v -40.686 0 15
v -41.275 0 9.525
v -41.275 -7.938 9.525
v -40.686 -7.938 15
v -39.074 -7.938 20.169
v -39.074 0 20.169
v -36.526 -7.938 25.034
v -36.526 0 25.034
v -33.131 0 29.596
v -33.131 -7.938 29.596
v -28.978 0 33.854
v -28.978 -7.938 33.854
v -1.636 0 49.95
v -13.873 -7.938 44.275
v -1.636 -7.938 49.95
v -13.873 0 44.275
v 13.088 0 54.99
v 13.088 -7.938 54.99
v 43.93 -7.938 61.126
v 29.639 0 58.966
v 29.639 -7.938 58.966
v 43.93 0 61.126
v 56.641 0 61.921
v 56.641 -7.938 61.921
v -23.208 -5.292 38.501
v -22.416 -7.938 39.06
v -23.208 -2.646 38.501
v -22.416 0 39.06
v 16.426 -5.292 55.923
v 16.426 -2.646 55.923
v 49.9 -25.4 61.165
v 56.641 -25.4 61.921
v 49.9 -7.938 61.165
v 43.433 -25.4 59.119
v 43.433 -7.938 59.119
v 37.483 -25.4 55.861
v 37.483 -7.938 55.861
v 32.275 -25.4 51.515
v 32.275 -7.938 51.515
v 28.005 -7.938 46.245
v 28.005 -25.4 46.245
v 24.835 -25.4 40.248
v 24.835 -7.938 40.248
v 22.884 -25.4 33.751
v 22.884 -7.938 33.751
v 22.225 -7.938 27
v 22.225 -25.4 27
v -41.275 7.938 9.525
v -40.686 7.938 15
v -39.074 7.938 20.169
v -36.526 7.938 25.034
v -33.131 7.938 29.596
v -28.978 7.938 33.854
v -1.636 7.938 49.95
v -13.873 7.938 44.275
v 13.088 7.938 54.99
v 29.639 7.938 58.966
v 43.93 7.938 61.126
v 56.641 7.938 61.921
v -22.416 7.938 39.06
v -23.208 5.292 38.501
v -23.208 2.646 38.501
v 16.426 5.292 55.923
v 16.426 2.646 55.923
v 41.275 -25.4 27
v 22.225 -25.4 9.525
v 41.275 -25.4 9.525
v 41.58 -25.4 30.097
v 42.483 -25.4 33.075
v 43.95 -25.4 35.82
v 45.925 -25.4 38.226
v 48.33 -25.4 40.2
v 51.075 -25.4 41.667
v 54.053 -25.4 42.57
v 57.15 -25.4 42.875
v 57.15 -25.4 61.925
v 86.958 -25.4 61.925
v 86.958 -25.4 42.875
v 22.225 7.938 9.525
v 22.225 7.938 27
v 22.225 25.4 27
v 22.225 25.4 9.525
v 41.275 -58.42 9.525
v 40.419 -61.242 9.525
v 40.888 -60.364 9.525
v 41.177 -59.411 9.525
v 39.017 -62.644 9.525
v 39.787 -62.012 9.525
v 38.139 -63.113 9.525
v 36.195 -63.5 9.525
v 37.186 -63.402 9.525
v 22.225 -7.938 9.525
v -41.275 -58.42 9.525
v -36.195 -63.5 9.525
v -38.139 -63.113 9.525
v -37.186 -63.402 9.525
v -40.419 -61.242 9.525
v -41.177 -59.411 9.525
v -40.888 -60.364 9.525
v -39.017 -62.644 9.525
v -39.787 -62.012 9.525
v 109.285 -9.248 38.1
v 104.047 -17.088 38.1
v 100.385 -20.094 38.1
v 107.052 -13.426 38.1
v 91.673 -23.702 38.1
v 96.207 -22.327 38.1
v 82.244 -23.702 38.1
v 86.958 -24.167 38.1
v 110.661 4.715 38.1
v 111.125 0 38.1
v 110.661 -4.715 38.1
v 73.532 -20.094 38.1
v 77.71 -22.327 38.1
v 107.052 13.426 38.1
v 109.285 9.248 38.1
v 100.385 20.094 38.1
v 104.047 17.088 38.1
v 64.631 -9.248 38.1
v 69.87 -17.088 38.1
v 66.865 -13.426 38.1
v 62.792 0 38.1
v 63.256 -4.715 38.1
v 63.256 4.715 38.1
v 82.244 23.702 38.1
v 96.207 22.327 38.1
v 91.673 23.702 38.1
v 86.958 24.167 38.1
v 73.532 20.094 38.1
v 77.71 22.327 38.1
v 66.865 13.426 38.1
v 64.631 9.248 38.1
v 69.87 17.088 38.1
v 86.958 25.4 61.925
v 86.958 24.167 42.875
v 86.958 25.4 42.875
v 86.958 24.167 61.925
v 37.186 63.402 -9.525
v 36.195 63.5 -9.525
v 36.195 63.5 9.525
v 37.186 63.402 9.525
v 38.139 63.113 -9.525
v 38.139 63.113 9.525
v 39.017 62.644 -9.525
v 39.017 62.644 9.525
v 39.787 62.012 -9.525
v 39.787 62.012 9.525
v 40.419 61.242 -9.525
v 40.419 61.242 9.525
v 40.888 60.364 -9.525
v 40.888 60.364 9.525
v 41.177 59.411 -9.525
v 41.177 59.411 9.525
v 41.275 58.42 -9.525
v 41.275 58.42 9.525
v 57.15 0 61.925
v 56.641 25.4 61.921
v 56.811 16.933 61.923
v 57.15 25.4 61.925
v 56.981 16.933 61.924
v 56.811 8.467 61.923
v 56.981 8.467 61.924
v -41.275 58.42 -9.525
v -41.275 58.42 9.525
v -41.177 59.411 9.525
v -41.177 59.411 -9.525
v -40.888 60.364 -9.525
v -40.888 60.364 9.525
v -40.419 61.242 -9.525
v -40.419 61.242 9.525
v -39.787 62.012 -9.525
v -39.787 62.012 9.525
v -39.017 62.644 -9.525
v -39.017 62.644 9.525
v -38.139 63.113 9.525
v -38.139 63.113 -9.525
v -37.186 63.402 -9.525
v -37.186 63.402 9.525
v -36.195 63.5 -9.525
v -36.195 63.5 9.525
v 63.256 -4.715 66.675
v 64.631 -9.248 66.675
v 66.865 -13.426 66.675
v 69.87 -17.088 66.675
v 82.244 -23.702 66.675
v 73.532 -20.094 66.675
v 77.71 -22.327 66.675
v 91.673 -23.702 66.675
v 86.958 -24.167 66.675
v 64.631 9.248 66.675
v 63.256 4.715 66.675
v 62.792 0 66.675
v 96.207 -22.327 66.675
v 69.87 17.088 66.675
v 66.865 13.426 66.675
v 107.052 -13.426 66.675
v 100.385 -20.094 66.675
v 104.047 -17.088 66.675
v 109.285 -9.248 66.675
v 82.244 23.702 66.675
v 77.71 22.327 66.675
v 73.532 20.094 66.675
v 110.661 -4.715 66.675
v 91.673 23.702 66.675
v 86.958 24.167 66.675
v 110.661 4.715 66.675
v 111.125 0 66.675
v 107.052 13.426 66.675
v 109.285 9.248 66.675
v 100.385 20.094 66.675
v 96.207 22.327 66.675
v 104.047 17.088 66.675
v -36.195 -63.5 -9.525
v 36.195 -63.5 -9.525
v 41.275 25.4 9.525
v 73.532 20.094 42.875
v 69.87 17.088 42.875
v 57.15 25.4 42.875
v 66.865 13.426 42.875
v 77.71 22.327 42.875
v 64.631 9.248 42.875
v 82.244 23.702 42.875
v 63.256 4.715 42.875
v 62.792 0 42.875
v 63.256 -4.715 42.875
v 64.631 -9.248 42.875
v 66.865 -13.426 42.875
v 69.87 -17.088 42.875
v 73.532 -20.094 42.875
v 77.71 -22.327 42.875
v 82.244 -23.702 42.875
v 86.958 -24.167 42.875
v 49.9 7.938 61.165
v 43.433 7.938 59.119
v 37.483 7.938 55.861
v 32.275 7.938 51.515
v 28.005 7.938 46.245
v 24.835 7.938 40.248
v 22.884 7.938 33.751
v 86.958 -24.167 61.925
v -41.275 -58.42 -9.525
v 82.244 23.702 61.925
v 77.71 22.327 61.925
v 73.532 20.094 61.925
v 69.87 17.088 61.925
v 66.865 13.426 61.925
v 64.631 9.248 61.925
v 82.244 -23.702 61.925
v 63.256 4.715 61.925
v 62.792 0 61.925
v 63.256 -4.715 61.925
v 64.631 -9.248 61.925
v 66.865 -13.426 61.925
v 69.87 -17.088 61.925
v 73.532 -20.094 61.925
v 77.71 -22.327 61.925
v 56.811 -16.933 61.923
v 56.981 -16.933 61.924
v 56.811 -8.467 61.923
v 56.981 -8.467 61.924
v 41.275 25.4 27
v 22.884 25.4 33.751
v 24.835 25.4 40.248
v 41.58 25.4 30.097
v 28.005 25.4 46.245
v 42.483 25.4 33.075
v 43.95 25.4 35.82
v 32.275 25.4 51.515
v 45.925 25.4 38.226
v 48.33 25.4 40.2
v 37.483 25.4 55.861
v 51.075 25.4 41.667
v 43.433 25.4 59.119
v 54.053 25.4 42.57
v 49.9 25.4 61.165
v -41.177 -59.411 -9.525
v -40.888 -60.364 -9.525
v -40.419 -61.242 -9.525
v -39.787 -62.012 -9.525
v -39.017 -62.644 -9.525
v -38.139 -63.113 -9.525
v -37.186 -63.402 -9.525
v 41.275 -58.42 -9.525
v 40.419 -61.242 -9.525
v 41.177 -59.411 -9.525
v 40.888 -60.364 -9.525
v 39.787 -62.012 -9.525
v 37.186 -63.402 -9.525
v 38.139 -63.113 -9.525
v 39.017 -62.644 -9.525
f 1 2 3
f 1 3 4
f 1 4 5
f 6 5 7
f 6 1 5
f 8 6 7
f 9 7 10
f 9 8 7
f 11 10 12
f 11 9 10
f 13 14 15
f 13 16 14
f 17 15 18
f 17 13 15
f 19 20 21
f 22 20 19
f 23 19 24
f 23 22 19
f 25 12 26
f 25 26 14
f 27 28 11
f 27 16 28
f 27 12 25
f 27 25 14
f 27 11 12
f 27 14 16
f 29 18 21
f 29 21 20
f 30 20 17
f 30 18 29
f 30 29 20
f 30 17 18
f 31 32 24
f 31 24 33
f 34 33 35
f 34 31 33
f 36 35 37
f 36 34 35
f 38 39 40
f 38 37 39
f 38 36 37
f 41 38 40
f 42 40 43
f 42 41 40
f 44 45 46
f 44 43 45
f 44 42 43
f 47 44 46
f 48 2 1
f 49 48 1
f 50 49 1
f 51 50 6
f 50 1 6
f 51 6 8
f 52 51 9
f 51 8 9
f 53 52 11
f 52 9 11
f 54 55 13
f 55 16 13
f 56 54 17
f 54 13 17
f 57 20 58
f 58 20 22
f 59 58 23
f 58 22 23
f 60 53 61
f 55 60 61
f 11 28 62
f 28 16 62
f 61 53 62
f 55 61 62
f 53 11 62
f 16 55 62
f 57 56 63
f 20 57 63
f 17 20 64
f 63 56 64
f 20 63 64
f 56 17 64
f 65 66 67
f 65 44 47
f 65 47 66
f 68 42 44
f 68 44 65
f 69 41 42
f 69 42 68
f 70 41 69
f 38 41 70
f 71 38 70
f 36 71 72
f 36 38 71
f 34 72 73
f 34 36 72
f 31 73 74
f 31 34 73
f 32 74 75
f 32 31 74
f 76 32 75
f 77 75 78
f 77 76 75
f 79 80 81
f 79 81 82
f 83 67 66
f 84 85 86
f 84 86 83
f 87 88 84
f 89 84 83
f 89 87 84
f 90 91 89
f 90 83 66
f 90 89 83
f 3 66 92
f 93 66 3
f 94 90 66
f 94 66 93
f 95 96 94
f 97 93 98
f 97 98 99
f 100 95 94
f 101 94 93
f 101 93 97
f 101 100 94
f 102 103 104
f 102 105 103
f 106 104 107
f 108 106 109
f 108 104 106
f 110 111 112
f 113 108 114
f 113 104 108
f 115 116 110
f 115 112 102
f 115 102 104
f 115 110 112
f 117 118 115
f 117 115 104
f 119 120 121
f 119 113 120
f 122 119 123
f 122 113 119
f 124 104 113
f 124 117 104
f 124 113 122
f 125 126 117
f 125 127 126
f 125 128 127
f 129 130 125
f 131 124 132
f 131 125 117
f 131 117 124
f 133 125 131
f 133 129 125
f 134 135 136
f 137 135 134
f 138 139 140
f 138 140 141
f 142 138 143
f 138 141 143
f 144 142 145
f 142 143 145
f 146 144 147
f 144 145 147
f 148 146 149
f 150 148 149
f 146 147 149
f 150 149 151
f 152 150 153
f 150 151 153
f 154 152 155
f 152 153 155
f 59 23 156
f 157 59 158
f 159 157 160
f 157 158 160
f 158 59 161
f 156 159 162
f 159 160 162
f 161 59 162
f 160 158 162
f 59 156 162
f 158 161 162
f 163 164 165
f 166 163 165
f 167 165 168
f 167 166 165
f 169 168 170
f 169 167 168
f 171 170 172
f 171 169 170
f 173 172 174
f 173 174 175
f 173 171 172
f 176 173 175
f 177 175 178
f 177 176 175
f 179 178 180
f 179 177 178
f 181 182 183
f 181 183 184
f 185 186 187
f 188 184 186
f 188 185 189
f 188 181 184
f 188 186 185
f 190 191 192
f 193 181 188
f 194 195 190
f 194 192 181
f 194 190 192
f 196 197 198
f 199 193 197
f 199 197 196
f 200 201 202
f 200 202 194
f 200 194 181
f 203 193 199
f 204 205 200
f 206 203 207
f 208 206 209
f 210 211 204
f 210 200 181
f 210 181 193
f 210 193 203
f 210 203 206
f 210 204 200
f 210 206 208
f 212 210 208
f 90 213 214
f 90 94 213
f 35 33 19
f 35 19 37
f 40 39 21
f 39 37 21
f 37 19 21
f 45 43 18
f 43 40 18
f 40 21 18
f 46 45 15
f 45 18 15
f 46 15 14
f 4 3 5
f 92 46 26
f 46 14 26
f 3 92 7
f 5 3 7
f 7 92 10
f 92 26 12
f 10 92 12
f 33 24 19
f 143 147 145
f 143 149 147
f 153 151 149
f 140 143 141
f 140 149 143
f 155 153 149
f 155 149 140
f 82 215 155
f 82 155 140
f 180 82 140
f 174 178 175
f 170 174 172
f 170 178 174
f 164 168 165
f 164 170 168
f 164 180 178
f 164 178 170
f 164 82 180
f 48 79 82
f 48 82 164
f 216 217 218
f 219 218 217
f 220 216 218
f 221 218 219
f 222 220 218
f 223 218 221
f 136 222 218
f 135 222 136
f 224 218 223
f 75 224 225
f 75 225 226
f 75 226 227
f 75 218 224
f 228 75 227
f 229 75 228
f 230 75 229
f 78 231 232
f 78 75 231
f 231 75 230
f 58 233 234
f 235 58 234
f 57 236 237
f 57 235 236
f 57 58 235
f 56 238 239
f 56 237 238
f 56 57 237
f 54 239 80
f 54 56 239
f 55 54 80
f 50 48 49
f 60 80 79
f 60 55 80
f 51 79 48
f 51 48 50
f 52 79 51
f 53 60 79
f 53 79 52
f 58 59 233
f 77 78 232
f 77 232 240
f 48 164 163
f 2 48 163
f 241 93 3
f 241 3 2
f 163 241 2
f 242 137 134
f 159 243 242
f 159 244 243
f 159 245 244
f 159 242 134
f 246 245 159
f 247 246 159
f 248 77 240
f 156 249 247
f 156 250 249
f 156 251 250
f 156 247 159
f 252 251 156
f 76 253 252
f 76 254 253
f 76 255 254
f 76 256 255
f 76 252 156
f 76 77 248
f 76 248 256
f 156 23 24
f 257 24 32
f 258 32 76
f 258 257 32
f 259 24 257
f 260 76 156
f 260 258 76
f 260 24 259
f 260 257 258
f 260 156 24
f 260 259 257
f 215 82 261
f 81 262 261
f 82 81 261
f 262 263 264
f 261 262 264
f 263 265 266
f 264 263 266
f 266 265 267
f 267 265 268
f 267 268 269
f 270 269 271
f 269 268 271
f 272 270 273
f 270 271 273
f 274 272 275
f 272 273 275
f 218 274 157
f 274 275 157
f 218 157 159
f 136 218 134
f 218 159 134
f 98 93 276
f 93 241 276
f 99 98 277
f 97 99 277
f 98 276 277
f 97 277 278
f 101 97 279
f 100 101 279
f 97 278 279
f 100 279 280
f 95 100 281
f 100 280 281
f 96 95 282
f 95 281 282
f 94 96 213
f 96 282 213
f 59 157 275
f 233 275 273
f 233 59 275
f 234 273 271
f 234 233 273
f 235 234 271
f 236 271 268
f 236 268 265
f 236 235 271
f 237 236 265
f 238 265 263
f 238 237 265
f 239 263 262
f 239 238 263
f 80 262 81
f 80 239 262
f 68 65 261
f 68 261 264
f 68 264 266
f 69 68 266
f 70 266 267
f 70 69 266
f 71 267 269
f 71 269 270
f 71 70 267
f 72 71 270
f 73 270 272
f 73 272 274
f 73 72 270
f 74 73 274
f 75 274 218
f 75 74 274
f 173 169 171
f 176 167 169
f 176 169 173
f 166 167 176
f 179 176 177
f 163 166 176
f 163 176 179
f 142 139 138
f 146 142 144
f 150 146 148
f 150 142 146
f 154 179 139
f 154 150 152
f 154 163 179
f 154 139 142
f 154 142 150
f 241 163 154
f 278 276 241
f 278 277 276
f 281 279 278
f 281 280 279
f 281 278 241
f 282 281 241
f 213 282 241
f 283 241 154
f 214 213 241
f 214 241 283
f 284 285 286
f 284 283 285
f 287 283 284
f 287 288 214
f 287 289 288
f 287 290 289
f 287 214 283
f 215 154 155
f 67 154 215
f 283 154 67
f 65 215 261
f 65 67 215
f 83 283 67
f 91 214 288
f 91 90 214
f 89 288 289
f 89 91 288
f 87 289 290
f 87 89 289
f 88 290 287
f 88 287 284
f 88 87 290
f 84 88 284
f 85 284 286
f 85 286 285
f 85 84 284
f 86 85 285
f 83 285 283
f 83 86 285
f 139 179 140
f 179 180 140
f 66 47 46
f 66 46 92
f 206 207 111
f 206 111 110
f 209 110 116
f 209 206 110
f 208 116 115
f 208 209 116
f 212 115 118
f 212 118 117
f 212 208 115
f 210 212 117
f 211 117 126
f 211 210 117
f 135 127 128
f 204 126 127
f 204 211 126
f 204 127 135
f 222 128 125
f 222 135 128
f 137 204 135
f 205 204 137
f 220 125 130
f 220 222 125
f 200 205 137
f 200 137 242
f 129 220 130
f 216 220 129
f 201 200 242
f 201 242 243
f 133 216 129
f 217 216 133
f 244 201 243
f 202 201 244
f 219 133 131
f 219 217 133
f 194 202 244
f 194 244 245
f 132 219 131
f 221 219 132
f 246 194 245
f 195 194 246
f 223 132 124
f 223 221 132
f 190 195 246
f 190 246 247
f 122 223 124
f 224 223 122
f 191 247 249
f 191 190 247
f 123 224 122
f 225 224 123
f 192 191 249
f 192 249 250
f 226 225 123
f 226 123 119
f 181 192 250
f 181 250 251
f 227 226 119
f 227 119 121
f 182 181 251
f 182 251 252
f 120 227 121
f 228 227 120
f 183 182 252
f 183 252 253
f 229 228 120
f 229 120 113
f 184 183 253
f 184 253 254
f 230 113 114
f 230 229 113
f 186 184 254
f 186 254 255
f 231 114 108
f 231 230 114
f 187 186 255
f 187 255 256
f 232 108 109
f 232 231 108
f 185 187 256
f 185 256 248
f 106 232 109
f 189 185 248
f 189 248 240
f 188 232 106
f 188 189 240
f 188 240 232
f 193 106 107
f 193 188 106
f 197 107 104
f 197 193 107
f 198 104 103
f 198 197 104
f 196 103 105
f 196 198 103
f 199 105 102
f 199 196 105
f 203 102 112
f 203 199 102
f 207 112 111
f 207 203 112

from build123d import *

# Parameters (mm, degrees)
F0_W     = 26.6334357138
F0_H     = 19.05
F1_DEPTH = 25.4
F2_DEPTH = 63.5
F3_DEPTH = 7.9375
F4_R     = 5.08


with BuildPart() as f1:
    # F0 (on Front) → F1 (new body, symmetric)
    with BuildSketch(Plane.XZ):
        with BuildLine():
            Line((22.225, 9.525), (41.275, 9.525))
            Line((41.275, 9.525), (41.275, 27.0002))
            ThreePointArc((41.275, 27.0002), (45.9246798487, 38.2255201513), (57.15, 42.8752))
            Line((57.15, 42.8752), (60.325, 42.8752))
            Line((60.325, 42.8752), (60.325, 61.9252))
            Line((60.325, 61.9252), (57.15, 61.9252))
            add(Edge.make_bspline(
                [(56.6413277741, 61.9214954738), (56.8116800634, 61.9231681109), (56.9812416063, 61.9244029276), (57.15, 61.9252)],
                knots=[110.9405929151, 110.9405929151, 110.9405929151, 110.9405929151, 111.5045361635, 111.5045361635, 111.5045361635, 111.5045361635], degree=3))
            ThreePointArc((56.6413277741, 61.9214954738), (32.2751029903, 51.515401891), (22.225, 27.0002))
            Line((22.225, 27.0002), (22.225, 9.525))
        make_face()
        with Locations((73.6417178569, 52.4002)):
            Rectangle(F0_W, F0_H)
    extrude(amount=F1_DEPTH, both=True)

    # F0 (on Front) → F2 (join, symmetric)
    with BuildSketch(Plane.XZ):
        Polygon((-41.275, 9.525), (-41.275, -9.525), (41.275, -9.525), (41.275, 9.525), (22.225, 9.525), align=None)
    extrude(amount=F2_DEPTH, both=True)

    # F0 (on Front) → F3 (join, symmetric)
    with BuildSketch(Plane.XZ):
        with BuildLine():
            add(Edge.make_bspline(
                [(-41.275, 9.525), (-40.9849167943, 44.3197871826), (23.1291188202, 61.5924493311), (56.6413277741, 61.9214954738)],
                knots=[0, 0, 0, 0, 110.9405929151, 110.9405929151, 110.9405929151, 110.9405929151], degree=3))
            Line((-41.275, 9.525), (22.225, 9.525))
            Line((22.225, 9.525), (22.225, 27.0002))
            ThreePointArc((22.225, 27.0002), (32.2751029903, 51.515401891), (56.6413277741, 61.9214954738))
        make_face()
    extrude(amount=F3_DEPTH, both=True)

    # F4
    f4_edges = [f1.edges().sort_by_distance(p)[0] for p in [
        (-41.275, 63.5, 0),
        (41.275, 63.5, 0),
        (41.275, -63.5, 0),
        (-41.275, -63.5, 0),
    ]]
    fillet(f4_edges, radius=F4_R)

    # F0 (on Front) → F5 (revolve)
    with BuildSketch(Plane.XZ):
        Polygon((86.9584357138, 66.675), (86.9584357138, 61.9252), (86.9584357138, 42.8752), (86.9584357138, 38.1), (111.125, 38.1), (111.125, 66.675), align=None)
    revolve(axis=Axis((86.9584357138, 0, 52.3875), (0, 0, 1)))


solid = f1.part
